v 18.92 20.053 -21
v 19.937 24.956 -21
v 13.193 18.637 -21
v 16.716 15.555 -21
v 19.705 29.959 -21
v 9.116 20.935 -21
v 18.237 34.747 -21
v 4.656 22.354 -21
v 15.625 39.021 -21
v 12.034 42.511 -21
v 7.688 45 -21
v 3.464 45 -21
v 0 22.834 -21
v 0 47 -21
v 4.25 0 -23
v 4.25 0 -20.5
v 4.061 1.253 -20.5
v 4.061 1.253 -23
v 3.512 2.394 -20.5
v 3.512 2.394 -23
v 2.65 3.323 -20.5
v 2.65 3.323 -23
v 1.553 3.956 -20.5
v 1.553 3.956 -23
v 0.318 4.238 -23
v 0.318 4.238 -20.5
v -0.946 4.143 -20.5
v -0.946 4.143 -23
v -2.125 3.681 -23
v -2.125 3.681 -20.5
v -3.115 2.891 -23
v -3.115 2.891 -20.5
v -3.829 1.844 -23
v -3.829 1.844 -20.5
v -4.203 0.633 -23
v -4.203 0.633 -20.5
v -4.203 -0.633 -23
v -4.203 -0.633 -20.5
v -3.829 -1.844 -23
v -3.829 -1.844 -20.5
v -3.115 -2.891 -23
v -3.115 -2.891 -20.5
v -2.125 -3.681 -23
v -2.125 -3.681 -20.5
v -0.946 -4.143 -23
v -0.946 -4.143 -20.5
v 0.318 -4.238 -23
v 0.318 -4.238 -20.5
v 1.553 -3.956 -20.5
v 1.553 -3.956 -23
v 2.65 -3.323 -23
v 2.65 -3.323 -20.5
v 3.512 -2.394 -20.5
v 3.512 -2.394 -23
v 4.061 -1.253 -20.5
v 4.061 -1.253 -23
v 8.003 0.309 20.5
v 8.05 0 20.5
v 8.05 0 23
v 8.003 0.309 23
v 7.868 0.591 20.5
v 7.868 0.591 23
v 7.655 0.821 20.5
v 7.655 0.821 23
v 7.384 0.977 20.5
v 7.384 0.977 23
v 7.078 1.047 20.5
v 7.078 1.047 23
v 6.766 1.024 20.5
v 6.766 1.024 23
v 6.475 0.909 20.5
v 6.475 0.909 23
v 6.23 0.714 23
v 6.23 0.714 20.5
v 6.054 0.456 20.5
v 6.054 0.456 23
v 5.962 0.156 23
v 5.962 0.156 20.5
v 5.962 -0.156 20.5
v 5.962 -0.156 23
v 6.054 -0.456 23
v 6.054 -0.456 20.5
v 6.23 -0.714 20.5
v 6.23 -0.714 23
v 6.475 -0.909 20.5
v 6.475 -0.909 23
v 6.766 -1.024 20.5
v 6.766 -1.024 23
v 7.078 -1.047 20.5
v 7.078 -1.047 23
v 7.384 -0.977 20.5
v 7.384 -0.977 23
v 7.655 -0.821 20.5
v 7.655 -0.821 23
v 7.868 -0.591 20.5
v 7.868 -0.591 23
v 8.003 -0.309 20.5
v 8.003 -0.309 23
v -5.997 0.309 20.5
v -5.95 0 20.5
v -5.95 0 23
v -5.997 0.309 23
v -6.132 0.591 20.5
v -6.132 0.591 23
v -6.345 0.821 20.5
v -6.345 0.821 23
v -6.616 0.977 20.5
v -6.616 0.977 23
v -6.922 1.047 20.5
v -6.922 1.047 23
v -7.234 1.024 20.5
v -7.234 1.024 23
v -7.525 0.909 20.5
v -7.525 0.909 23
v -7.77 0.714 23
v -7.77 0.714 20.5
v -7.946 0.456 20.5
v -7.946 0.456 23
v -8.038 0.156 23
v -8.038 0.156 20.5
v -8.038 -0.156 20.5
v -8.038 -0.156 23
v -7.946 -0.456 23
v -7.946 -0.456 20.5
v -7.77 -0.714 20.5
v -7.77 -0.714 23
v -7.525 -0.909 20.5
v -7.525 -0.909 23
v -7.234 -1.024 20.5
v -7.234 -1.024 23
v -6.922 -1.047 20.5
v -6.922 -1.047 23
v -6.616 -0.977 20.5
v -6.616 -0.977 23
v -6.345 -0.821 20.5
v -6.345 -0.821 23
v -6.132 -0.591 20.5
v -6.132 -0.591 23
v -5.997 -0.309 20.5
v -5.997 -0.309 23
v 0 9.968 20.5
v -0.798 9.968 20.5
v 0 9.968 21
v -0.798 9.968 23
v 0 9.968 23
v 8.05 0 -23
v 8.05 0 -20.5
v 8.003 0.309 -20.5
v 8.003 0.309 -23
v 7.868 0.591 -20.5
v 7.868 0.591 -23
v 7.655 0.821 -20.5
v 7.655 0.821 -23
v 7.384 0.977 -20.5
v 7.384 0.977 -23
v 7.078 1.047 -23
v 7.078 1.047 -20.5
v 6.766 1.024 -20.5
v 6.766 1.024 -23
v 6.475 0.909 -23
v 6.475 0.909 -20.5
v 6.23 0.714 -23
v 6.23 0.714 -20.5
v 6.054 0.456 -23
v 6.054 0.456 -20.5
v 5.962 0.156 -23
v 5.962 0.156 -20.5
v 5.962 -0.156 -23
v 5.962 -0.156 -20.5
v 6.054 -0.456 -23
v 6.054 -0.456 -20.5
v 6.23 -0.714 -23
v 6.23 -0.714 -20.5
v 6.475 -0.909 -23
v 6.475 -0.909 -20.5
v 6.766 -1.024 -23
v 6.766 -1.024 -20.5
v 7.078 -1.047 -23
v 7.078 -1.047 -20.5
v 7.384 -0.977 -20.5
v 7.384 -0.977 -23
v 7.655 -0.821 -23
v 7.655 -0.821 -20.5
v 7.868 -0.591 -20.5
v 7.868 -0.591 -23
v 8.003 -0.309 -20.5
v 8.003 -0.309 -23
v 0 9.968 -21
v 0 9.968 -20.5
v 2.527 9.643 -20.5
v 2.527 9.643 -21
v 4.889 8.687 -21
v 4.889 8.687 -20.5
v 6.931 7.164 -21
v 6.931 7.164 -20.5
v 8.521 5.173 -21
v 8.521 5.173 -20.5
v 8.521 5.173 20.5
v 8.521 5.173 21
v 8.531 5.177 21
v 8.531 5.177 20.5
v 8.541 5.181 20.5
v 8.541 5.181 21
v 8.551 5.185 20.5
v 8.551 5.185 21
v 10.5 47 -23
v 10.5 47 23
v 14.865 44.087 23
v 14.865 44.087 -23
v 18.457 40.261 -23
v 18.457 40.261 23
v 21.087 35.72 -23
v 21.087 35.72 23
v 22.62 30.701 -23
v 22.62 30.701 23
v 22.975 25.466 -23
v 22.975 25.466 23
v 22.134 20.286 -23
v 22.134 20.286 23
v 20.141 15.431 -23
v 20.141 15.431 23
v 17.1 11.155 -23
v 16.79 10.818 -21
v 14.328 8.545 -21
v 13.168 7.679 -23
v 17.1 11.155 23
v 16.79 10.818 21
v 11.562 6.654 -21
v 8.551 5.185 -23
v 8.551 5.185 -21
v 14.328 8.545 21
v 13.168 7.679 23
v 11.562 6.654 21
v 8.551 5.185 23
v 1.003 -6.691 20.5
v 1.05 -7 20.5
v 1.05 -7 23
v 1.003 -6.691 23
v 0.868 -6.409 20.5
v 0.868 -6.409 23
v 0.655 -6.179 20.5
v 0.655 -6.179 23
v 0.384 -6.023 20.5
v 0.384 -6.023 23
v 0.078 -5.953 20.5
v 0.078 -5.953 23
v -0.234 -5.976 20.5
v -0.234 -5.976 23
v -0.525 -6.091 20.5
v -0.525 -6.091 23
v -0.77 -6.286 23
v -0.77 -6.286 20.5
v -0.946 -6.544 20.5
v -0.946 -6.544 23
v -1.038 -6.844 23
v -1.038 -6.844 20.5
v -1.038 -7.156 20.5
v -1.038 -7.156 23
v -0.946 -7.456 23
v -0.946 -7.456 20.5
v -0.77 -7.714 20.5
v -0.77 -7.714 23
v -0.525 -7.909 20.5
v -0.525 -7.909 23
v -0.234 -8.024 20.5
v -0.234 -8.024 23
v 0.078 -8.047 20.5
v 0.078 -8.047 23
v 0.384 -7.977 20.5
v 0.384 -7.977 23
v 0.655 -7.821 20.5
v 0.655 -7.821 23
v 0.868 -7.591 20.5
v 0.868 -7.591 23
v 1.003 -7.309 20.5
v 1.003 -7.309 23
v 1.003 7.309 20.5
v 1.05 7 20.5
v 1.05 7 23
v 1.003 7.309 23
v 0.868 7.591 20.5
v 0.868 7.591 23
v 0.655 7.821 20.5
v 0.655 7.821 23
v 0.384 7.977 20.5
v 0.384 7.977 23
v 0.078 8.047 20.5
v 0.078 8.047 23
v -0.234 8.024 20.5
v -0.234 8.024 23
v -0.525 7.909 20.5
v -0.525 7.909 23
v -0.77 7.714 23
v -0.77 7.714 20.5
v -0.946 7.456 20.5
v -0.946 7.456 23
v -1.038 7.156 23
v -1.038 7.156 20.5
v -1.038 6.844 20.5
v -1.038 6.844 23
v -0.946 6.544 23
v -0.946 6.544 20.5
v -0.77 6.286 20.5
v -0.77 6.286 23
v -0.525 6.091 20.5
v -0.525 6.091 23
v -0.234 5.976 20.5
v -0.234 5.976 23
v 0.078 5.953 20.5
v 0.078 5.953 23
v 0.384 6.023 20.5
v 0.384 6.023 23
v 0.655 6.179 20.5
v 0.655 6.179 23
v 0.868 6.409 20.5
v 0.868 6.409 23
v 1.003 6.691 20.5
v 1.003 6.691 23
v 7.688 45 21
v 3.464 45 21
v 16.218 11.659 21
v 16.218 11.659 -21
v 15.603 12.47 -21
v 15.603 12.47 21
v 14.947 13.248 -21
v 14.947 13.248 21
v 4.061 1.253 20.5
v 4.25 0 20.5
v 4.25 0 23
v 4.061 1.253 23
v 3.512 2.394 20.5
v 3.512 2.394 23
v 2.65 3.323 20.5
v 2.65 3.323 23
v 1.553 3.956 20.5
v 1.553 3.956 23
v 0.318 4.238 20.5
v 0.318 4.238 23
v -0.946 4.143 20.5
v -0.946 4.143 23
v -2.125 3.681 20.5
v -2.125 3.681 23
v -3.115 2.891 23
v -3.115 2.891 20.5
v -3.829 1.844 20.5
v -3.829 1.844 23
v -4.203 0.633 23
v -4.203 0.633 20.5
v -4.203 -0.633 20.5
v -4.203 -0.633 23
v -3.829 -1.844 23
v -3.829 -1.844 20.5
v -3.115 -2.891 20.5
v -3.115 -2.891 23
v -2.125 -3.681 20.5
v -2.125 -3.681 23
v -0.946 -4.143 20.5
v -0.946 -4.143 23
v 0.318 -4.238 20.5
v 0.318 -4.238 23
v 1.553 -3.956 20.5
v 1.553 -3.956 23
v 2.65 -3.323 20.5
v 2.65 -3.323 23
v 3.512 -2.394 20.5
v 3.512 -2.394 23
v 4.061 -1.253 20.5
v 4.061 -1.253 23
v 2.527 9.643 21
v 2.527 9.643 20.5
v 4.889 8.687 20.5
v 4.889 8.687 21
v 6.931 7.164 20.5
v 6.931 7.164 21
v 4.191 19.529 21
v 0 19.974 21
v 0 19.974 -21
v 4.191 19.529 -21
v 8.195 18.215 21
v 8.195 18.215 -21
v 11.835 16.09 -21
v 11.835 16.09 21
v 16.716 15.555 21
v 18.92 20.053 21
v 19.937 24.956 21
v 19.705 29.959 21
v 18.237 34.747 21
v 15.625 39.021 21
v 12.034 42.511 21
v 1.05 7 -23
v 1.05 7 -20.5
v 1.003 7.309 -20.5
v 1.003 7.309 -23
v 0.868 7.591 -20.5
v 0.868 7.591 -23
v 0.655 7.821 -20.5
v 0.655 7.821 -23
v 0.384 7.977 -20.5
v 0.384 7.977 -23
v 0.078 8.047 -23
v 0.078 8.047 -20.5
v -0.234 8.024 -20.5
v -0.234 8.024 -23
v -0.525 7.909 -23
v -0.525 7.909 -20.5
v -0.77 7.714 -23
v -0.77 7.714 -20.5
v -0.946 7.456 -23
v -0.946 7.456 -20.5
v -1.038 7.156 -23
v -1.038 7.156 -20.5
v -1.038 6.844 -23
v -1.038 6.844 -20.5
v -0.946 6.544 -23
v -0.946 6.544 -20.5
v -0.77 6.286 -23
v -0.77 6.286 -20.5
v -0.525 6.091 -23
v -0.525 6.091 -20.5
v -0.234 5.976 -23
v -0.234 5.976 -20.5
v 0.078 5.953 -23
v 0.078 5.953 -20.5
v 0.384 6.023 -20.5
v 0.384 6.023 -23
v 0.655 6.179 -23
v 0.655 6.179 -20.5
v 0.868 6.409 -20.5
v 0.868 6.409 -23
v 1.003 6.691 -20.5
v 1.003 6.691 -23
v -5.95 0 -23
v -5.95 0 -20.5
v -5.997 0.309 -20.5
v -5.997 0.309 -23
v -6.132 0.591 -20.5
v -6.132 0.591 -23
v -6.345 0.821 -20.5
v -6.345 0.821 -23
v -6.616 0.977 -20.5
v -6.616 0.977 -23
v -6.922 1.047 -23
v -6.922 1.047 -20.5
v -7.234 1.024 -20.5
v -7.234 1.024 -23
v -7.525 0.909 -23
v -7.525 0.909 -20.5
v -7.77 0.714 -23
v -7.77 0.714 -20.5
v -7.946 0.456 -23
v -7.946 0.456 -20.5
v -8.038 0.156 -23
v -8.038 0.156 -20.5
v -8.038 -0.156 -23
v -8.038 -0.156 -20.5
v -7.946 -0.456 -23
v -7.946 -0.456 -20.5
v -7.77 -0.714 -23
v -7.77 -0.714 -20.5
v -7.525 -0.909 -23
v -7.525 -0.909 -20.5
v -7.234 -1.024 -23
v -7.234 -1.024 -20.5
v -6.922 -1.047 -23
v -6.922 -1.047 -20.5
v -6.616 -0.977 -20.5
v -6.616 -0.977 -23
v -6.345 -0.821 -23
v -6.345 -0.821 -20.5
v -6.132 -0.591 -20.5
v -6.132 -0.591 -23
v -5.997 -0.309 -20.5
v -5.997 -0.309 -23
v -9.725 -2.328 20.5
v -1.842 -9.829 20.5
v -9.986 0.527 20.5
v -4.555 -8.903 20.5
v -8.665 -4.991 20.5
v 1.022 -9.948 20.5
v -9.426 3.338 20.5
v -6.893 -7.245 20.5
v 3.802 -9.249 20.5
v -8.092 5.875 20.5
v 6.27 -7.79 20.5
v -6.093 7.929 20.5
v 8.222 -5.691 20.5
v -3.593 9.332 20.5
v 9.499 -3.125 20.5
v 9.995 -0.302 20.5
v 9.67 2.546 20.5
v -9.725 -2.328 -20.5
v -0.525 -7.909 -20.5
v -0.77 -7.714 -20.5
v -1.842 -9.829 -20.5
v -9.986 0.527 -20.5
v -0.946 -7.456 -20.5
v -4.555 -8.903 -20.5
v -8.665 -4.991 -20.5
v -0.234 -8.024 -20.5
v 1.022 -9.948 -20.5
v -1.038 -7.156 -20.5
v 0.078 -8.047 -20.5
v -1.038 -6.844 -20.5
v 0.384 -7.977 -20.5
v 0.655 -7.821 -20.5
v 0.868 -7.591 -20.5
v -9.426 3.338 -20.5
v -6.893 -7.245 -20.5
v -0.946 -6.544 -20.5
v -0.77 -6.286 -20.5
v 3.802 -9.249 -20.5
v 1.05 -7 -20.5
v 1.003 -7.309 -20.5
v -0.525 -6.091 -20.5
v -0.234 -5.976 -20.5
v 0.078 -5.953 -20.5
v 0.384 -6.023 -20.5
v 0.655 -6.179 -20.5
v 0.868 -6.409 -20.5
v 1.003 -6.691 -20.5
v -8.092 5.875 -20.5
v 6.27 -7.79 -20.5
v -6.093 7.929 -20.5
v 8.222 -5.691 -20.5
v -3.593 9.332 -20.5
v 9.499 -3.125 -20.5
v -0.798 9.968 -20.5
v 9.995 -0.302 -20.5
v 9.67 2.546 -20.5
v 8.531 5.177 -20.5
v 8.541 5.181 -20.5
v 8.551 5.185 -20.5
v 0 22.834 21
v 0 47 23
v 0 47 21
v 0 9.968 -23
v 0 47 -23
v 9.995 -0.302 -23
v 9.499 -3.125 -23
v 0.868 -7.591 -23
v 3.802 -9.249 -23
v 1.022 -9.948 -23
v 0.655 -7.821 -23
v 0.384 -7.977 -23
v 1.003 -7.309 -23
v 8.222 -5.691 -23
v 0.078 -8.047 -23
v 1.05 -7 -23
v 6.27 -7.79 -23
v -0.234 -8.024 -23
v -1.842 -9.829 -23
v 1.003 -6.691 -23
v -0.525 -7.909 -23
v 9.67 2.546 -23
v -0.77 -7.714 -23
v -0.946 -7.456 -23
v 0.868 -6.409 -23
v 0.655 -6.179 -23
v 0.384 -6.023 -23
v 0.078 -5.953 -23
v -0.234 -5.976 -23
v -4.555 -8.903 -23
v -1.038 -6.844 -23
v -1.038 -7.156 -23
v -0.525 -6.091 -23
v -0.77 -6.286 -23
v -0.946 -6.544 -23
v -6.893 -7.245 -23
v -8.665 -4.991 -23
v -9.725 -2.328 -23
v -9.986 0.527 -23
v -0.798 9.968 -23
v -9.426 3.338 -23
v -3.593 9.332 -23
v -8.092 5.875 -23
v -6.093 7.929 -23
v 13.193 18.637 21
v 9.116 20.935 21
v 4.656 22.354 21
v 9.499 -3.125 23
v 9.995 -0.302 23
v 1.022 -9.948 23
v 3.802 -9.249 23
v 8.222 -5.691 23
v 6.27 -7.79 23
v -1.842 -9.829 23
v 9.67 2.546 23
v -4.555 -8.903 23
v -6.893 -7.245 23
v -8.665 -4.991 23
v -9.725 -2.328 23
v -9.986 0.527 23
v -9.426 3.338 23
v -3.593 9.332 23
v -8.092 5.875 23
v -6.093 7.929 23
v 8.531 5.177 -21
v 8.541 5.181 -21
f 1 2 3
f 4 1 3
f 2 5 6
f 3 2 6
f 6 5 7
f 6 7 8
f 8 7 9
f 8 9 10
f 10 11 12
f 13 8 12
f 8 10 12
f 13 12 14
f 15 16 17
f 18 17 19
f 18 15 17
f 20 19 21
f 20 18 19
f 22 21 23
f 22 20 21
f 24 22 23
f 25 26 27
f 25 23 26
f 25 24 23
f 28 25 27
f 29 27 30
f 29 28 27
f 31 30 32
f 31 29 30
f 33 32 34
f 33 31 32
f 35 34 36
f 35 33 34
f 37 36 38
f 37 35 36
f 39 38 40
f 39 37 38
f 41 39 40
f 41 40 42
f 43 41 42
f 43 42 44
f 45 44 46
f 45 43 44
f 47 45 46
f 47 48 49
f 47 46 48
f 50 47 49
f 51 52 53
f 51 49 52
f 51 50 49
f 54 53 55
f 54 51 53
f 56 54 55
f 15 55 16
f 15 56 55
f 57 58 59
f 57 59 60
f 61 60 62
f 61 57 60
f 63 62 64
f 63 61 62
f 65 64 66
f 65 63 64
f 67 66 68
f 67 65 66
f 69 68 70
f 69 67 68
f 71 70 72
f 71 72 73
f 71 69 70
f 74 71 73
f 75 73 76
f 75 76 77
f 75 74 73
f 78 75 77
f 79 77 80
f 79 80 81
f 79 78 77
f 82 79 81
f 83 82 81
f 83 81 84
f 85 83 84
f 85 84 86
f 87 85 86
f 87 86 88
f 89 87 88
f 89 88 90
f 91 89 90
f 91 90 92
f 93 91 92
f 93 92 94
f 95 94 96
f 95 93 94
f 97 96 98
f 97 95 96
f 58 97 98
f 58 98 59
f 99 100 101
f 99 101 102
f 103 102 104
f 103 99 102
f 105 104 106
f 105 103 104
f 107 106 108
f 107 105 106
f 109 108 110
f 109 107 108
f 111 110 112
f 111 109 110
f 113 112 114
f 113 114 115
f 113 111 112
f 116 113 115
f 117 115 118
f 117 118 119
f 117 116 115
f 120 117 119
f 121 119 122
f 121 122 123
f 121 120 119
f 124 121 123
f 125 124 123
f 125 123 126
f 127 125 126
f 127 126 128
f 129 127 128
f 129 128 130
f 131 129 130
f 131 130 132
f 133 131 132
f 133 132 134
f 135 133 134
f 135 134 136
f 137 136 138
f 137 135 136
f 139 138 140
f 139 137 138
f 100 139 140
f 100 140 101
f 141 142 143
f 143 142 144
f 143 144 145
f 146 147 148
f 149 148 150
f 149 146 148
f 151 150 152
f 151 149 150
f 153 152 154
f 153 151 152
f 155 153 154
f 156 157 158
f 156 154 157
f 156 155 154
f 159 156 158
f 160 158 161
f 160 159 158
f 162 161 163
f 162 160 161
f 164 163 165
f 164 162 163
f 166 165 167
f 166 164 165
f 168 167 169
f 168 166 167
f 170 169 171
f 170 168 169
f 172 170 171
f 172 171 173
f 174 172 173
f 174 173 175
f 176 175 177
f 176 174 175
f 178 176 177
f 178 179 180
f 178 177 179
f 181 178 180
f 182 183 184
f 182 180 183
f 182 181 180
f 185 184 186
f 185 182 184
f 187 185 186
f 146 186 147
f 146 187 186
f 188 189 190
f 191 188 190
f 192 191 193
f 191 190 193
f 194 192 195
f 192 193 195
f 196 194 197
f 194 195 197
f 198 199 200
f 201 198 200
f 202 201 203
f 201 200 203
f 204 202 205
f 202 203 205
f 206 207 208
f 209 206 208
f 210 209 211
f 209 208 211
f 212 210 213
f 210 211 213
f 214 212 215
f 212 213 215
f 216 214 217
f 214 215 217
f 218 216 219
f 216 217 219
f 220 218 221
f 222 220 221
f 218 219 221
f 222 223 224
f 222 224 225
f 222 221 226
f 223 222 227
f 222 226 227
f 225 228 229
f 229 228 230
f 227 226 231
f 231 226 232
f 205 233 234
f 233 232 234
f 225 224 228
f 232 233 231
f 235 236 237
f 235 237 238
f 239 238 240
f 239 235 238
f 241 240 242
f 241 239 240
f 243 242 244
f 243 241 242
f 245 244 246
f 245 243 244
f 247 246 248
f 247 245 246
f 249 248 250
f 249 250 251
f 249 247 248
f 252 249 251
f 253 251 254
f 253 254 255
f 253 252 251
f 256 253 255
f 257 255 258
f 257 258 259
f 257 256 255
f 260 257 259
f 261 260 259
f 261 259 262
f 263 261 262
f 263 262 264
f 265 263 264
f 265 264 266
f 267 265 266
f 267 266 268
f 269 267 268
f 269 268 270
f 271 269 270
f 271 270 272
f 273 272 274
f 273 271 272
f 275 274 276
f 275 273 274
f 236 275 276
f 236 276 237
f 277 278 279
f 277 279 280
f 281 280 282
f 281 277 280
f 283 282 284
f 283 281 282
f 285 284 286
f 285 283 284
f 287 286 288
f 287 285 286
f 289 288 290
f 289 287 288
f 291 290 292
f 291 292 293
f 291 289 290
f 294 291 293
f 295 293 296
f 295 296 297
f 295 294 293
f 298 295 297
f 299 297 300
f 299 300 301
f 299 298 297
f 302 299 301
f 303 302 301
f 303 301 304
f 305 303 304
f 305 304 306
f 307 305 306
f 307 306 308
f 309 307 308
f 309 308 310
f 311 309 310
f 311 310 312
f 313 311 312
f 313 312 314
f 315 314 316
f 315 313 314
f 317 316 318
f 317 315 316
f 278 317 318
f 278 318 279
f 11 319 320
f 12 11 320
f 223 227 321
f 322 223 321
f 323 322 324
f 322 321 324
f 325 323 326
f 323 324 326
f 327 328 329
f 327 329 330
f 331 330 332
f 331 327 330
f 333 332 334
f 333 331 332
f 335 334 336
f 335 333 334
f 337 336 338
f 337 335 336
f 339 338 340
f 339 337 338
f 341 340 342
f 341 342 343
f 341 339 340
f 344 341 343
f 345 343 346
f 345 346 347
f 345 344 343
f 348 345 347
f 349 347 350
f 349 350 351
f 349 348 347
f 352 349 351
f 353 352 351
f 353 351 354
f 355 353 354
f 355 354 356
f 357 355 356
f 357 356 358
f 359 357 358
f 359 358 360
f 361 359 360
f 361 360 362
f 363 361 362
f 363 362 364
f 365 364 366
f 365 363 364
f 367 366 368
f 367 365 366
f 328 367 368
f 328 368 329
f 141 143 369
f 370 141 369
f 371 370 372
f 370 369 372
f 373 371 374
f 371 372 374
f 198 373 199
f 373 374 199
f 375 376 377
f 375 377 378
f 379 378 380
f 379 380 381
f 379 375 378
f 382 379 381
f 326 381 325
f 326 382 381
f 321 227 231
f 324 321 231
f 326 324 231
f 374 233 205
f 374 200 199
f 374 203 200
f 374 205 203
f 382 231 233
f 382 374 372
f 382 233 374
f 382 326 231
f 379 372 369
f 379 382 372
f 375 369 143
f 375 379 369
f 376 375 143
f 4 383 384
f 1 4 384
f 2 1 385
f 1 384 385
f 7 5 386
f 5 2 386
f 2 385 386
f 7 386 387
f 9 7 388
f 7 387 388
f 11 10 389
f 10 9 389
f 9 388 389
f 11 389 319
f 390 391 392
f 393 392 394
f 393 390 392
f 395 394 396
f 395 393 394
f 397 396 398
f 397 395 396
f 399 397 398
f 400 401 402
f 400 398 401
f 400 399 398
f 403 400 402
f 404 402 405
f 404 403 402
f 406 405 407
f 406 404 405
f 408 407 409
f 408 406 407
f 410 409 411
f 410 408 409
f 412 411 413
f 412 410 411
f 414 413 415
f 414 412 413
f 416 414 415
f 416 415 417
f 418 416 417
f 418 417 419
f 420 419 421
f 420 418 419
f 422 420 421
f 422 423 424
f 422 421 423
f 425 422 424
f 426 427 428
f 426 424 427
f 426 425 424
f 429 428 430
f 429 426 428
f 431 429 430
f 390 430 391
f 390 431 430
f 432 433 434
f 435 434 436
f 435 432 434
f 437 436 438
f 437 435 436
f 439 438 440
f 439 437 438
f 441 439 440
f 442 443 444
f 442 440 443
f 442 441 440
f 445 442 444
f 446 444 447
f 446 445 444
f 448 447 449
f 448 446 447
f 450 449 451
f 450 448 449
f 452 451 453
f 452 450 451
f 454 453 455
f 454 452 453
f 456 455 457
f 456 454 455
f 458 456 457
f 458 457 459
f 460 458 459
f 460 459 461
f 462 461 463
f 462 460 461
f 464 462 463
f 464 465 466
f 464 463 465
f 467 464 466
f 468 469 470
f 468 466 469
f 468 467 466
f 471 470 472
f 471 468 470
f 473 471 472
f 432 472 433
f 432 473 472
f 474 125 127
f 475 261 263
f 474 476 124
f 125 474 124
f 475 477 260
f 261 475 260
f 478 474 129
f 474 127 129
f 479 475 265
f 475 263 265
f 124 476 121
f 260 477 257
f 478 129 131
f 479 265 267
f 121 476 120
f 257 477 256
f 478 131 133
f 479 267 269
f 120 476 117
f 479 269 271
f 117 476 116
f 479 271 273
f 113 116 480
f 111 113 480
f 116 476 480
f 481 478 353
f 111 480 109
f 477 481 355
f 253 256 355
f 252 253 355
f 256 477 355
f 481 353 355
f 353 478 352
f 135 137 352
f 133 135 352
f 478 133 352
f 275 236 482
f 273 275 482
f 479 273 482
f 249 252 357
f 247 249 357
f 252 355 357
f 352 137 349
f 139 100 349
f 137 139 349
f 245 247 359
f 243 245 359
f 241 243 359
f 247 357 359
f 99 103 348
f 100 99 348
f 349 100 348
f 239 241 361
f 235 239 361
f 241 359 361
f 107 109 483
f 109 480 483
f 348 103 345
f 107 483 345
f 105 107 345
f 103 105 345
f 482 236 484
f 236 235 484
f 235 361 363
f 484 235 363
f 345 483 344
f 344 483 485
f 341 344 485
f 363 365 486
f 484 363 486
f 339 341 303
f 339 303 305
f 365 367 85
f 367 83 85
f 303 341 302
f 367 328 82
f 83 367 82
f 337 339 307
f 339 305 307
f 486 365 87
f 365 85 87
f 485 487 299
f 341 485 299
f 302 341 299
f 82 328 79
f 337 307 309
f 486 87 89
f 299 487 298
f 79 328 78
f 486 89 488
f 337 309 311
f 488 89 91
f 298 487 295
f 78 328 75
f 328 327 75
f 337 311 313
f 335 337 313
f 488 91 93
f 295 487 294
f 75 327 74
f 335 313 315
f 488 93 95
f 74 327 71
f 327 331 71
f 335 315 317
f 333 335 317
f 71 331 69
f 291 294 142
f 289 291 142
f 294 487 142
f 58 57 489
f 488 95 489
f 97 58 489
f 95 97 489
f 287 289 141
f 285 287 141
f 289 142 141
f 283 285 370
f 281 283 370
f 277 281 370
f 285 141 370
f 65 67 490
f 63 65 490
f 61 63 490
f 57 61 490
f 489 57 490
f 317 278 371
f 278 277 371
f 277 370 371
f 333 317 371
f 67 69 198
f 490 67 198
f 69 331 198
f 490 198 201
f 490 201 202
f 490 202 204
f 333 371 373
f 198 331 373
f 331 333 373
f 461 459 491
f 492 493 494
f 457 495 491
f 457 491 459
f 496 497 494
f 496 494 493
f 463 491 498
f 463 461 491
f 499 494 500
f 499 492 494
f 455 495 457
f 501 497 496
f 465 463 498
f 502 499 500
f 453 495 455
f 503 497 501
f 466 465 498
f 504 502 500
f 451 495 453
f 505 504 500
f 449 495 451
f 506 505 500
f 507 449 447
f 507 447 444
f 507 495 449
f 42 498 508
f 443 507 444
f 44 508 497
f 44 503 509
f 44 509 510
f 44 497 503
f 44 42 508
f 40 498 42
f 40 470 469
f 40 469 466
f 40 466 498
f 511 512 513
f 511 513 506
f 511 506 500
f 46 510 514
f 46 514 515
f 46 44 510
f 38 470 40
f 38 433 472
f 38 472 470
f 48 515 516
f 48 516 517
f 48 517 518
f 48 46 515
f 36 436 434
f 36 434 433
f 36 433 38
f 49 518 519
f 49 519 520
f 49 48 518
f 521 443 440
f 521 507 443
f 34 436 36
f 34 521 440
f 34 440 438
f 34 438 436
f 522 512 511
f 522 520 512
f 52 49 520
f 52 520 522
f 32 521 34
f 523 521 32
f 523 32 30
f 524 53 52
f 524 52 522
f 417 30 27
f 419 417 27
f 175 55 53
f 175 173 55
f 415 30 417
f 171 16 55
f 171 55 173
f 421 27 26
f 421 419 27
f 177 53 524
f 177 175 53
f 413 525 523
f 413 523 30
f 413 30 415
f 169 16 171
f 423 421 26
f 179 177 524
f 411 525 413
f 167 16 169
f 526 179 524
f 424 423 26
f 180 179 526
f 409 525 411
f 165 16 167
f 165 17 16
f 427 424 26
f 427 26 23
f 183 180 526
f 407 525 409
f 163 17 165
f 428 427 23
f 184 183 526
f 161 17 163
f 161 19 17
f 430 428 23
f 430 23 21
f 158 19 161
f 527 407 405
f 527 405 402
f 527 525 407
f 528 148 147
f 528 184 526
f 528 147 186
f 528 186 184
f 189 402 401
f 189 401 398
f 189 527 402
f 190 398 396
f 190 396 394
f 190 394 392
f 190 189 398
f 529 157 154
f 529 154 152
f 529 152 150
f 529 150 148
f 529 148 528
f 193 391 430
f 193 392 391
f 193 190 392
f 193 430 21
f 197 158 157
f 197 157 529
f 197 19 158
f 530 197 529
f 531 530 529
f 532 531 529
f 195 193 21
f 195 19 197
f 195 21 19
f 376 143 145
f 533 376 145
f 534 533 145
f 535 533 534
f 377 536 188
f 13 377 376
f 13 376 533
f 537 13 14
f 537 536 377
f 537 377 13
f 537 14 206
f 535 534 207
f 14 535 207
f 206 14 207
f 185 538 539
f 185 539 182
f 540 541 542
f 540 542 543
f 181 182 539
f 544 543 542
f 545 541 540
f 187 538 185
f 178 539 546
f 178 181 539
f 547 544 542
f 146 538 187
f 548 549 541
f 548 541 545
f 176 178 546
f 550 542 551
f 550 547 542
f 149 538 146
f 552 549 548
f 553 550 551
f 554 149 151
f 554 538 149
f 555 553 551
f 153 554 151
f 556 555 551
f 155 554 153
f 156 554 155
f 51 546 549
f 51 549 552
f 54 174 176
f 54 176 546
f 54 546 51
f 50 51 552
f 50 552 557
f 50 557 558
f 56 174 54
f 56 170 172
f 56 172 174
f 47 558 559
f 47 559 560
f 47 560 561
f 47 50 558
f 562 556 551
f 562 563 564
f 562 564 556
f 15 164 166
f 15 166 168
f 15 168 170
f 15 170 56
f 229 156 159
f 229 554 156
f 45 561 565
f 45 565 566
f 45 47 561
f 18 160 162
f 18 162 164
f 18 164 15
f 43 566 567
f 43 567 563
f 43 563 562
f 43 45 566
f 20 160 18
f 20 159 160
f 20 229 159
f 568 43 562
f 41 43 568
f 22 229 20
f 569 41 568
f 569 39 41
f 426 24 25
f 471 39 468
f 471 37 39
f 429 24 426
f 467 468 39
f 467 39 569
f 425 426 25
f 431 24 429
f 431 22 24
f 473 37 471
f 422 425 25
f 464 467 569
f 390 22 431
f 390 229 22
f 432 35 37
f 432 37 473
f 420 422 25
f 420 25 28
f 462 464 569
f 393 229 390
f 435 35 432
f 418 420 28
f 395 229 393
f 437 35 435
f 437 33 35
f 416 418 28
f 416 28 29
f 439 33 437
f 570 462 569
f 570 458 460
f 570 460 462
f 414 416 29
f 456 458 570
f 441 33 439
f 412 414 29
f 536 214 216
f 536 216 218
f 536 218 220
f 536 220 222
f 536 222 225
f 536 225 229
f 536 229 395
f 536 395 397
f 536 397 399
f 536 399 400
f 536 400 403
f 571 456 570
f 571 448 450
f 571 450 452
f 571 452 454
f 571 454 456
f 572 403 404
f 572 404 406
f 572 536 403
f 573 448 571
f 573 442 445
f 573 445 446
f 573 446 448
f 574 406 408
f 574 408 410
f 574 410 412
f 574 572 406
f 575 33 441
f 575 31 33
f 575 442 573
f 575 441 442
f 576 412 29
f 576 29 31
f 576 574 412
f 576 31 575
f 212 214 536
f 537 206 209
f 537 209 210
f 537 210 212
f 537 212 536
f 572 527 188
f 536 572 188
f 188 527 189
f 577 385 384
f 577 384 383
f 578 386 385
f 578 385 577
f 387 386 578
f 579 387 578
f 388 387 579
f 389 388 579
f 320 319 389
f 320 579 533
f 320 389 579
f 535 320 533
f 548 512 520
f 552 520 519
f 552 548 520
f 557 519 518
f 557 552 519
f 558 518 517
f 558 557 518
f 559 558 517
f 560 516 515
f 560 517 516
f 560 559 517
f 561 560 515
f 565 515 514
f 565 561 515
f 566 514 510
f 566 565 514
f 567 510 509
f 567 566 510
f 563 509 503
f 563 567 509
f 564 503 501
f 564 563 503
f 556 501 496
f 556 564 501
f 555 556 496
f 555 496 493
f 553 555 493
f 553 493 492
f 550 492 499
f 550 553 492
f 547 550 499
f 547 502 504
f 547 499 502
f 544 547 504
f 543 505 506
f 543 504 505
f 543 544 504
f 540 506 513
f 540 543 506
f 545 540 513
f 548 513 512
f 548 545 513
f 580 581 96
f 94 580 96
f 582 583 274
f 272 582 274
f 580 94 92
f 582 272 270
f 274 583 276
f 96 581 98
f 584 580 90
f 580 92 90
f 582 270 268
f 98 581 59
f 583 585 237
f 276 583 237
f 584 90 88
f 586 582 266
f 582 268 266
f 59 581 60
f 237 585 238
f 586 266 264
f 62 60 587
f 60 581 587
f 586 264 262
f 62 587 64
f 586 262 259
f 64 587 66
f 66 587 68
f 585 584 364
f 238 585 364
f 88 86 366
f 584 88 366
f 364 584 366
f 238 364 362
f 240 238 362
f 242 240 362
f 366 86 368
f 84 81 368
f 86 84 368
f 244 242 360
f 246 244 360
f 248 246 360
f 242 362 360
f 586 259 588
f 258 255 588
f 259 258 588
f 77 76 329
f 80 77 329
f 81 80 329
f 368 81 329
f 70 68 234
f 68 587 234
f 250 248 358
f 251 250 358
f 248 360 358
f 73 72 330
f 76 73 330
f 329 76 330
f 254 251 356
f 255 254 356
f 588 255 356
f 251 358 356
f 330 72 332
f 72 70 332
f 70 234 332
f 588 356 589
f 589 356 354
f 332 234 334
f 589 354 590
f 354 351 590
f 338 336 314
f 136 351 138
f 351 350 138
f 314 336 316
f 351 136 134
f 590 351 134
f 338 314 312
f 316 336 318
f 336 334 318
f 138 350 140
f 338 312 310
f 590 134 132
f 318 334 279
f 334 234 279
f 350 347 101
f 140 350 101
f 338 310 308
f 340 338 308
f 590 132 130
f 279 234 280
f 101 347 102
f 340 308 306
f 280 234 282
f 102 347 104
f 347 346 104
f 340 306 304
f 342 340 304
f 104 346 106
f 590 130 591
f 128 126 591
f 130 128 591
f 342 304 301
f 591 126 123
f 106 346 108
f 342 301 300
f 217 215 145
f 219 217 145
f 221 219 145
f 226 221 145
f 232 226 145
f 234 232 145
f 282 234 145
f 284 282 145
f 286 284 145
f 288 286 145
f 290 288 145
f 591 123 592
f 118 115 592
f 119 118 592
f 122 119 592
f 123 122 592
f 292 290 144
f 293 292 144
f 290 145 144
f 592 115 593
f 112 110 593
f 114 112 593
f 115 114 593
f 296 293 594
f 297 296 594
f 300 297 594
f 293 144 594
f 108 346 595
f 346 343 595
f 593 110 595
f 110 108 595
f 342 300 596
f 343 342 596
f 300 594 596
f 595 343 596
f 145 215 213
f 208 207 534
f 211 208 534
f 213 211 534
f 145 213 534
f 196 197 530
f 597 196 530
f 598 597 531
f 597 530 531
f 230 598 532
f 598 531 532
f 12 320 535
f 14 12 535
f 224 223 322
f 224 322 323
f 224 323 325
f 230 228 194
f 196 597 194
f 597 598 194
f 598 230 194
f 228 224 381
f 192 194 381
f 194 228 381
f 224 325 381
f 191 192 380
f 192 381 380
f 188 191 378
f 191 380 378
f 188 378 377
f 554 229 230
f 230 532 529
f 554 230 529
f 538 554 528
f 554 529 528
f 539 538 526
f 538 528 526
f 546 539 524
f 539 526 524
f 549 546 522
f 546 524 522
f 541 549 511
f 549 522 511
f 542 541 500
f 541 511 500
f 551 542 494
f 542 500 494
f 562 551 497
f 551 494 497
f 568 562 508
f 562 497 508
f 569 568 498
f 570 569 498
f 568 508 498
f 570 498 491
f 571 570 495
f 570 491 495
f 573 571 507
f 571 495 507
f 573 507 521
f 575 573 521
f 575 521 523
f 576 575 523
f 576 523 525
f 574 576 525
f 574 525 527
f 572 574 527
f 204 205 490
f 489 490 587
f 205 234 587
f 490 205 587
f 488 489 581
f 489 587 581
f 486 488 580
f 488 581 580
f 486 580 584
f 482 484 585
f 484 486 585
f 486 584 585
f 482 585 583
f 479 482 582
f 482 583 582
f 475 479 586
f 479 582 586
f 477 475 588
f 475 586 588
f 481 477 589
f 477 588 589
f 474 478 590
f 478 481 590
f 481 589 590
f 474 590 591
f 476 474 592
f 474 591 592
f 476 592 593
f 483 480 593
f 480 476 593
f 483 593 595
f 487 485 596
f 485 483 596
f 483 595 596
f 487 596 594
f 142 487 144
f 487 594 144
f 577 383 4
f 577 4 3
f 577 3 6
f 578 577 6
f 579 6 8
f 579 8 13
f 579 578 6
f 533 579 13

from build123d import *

# Parameters (mm, degrees)
SKETCH1_R           = 4.25
SKETCH1_R_2         = 1.05
BOSS_EXTRUDE1_DEPTH = 23
BOSS_EXTRUDE3_DEPTH = 2
SKETCH4_W           = 21
SKETCH4_H           = 41
CUT_EXTRUDE1_DEPTH  = 50.288548817
BOSS_EXTRUDE4_START = 42
BOSS_EXTRUDE4_DEPTH = 42
CUT_EXTRUDE4_REACH  = 70.367


with BuildPart() as part:
    # Sketch1 → Boss-Extrude1 (new, symmetric)
    with BuildSketch(Plane.XY):
        with BuildLine():
            Line((-0.798015115, 9.968107738), (11.201984885, 9.968107738))
            ThreePointArc((11.201984885, 9.968107738), (19.90012903, 28.53283063), (7.687881875, 45))
            Line((7.687881875, 45), (3.464101615, 45))
            Line((3.464101615, 45), (0, 47))
            Line((0, 47), (10.5, 47))
            ThreePointArc((10.5, 47), (22.975048867, 25.465576737), (8.550692083, 5.18513885))
            ThreePointArc((8.550692083, 5.18513885), (-4.554689659, -8.902516617), (-0.798015115, 9.968107738))
        make_face()
        Circle(SKETCH1_R, mode=Mode.SUBTRACT)
        with Locations((0, 7)):
            Circle(SKETCH1_R_2, mode=Mode.SUBTRACT)
        with Locations((7, 0)):
            Circle(SKETCH1_R_2, mode=Mode.SUBTRACT)
        with Locations((0, -7)):
            Circle(SKETCH1_R_2, mode=Mode.SUBTRACT)
        with Locations((-7, 0)):
            Circle(SKETCH1_R_2, mode=Mode.SUBTRACT)
    extrude(amount=BOSS_EXTRUDE1_DEPTH, both=True)

    # Sketch3 → Boss-Extrude3 (add)
    with BuildSketch(Plane.XY.offset(23)):
        with BuildLine():
            Line((0, 47), (3.464101615, 45))
            Line((3.464101615, 45), (7.687881875, 45))
            ThreePointArc((7.687881875, 45), (19.90012903, 28.53283063), (11.201984885, 9.968107738))
            Line((11.201984885, 9.968107738), (0, 9.968107738))
            Line((0, 9.968107738), (0, 47))
        make_face()
    boss_extrude3 = extrude(amount=-BOSS_EXTRUDE3_DEPTH)

    # Mirror1: Boss-Extrude3 across plane
    add(boss_extrude3.mirror(Plane.XY))

    # Sketch4 → Cut-Extrude1 (cut, through all)
    with BuildSketch(Plane(origin=(0, 9.968107738, 0), x_dir=(1, 0, 0), z_dir=(0, 1, 0))):
        Rectangle(SKETCH4_W, SKETCH4_H)
    extrude(amount=-CUT_EXTRUDE1_DEPTH, mode=Mode.SUBTRACT)

    # Sketch6 → Boss-Extrude4 (add)
    with BuildSketch(Plane.XY.offset(-21).offset(BOSS_EXTRUDE4_START)):
        with BuildLine():
            Line((0, 22.833916422), (0, 19.973613057))
            ThreePointArc((0, 19.973613057), (8.195306737, 18.214888581), (14.947380695, 13.248434961))
            ThreePointArc((14.947380695, 13.248434961), (15.873509775, 14.369790734), (16.715701567, 15.555483287))
            ThreePointArc((16.715701567, 15.555483287), (9.115786688, 20.935380871), (0, 22.833916422))
        make_face()
    extrude(amount=-BOSS_EXTRUDE4_DEPTH)

    # Cut-Extrude4: up to this face of the body (flat: up to its plane)
    cut_extrude4_end = Plane(part.part.faces().sort_by_distance((6.103448613, 14.332073809, -21))[0])
    # Sketch7 → Cut-Extrude4 (cut, up to the picked face)
    with BuildSketch(Plane(origin=(0, 0, 21), x_dir=(-1, 0, 0), z_dir=(0, 0, -1)), mode=Mode.PRIVATE) as cut_extrude4_sk1:
        with BuildLine():
            Line((0, 19.973613057), (0, 9.968107738))
            ThreePointArc((0, 9.968107738), (-4.88859678, 8.68704745), (-8.520668778, 5.173139806))
            ThreePointArc((-8.520668778, 5.173139806), (-12.966457487, 7.54001363), (-16.790465857, 10.817831339))
            ThreePointArc((-16.790465857, 10.817831339), (-9.562270684, 17.535911665), (0, 19.973613057))
        make_face()
    cut_extrude4_tool1 = split(extrude(cut_extrude4_sk1.sketch, amount=CUT_EXTRUDE4_REACH, mode=Mode.PRIVATE), bisect_by=cut_extrude4_end, keep=Keep.BOTH, mode=Mode.PRIVATE)
    add(cut_extrude4_tool1.solids().sort_by(Axis((7.299259, 12.896939, 21), (0, 0, -1)))[0], mode=Mode.SUBTRACT)


solid = part.part
